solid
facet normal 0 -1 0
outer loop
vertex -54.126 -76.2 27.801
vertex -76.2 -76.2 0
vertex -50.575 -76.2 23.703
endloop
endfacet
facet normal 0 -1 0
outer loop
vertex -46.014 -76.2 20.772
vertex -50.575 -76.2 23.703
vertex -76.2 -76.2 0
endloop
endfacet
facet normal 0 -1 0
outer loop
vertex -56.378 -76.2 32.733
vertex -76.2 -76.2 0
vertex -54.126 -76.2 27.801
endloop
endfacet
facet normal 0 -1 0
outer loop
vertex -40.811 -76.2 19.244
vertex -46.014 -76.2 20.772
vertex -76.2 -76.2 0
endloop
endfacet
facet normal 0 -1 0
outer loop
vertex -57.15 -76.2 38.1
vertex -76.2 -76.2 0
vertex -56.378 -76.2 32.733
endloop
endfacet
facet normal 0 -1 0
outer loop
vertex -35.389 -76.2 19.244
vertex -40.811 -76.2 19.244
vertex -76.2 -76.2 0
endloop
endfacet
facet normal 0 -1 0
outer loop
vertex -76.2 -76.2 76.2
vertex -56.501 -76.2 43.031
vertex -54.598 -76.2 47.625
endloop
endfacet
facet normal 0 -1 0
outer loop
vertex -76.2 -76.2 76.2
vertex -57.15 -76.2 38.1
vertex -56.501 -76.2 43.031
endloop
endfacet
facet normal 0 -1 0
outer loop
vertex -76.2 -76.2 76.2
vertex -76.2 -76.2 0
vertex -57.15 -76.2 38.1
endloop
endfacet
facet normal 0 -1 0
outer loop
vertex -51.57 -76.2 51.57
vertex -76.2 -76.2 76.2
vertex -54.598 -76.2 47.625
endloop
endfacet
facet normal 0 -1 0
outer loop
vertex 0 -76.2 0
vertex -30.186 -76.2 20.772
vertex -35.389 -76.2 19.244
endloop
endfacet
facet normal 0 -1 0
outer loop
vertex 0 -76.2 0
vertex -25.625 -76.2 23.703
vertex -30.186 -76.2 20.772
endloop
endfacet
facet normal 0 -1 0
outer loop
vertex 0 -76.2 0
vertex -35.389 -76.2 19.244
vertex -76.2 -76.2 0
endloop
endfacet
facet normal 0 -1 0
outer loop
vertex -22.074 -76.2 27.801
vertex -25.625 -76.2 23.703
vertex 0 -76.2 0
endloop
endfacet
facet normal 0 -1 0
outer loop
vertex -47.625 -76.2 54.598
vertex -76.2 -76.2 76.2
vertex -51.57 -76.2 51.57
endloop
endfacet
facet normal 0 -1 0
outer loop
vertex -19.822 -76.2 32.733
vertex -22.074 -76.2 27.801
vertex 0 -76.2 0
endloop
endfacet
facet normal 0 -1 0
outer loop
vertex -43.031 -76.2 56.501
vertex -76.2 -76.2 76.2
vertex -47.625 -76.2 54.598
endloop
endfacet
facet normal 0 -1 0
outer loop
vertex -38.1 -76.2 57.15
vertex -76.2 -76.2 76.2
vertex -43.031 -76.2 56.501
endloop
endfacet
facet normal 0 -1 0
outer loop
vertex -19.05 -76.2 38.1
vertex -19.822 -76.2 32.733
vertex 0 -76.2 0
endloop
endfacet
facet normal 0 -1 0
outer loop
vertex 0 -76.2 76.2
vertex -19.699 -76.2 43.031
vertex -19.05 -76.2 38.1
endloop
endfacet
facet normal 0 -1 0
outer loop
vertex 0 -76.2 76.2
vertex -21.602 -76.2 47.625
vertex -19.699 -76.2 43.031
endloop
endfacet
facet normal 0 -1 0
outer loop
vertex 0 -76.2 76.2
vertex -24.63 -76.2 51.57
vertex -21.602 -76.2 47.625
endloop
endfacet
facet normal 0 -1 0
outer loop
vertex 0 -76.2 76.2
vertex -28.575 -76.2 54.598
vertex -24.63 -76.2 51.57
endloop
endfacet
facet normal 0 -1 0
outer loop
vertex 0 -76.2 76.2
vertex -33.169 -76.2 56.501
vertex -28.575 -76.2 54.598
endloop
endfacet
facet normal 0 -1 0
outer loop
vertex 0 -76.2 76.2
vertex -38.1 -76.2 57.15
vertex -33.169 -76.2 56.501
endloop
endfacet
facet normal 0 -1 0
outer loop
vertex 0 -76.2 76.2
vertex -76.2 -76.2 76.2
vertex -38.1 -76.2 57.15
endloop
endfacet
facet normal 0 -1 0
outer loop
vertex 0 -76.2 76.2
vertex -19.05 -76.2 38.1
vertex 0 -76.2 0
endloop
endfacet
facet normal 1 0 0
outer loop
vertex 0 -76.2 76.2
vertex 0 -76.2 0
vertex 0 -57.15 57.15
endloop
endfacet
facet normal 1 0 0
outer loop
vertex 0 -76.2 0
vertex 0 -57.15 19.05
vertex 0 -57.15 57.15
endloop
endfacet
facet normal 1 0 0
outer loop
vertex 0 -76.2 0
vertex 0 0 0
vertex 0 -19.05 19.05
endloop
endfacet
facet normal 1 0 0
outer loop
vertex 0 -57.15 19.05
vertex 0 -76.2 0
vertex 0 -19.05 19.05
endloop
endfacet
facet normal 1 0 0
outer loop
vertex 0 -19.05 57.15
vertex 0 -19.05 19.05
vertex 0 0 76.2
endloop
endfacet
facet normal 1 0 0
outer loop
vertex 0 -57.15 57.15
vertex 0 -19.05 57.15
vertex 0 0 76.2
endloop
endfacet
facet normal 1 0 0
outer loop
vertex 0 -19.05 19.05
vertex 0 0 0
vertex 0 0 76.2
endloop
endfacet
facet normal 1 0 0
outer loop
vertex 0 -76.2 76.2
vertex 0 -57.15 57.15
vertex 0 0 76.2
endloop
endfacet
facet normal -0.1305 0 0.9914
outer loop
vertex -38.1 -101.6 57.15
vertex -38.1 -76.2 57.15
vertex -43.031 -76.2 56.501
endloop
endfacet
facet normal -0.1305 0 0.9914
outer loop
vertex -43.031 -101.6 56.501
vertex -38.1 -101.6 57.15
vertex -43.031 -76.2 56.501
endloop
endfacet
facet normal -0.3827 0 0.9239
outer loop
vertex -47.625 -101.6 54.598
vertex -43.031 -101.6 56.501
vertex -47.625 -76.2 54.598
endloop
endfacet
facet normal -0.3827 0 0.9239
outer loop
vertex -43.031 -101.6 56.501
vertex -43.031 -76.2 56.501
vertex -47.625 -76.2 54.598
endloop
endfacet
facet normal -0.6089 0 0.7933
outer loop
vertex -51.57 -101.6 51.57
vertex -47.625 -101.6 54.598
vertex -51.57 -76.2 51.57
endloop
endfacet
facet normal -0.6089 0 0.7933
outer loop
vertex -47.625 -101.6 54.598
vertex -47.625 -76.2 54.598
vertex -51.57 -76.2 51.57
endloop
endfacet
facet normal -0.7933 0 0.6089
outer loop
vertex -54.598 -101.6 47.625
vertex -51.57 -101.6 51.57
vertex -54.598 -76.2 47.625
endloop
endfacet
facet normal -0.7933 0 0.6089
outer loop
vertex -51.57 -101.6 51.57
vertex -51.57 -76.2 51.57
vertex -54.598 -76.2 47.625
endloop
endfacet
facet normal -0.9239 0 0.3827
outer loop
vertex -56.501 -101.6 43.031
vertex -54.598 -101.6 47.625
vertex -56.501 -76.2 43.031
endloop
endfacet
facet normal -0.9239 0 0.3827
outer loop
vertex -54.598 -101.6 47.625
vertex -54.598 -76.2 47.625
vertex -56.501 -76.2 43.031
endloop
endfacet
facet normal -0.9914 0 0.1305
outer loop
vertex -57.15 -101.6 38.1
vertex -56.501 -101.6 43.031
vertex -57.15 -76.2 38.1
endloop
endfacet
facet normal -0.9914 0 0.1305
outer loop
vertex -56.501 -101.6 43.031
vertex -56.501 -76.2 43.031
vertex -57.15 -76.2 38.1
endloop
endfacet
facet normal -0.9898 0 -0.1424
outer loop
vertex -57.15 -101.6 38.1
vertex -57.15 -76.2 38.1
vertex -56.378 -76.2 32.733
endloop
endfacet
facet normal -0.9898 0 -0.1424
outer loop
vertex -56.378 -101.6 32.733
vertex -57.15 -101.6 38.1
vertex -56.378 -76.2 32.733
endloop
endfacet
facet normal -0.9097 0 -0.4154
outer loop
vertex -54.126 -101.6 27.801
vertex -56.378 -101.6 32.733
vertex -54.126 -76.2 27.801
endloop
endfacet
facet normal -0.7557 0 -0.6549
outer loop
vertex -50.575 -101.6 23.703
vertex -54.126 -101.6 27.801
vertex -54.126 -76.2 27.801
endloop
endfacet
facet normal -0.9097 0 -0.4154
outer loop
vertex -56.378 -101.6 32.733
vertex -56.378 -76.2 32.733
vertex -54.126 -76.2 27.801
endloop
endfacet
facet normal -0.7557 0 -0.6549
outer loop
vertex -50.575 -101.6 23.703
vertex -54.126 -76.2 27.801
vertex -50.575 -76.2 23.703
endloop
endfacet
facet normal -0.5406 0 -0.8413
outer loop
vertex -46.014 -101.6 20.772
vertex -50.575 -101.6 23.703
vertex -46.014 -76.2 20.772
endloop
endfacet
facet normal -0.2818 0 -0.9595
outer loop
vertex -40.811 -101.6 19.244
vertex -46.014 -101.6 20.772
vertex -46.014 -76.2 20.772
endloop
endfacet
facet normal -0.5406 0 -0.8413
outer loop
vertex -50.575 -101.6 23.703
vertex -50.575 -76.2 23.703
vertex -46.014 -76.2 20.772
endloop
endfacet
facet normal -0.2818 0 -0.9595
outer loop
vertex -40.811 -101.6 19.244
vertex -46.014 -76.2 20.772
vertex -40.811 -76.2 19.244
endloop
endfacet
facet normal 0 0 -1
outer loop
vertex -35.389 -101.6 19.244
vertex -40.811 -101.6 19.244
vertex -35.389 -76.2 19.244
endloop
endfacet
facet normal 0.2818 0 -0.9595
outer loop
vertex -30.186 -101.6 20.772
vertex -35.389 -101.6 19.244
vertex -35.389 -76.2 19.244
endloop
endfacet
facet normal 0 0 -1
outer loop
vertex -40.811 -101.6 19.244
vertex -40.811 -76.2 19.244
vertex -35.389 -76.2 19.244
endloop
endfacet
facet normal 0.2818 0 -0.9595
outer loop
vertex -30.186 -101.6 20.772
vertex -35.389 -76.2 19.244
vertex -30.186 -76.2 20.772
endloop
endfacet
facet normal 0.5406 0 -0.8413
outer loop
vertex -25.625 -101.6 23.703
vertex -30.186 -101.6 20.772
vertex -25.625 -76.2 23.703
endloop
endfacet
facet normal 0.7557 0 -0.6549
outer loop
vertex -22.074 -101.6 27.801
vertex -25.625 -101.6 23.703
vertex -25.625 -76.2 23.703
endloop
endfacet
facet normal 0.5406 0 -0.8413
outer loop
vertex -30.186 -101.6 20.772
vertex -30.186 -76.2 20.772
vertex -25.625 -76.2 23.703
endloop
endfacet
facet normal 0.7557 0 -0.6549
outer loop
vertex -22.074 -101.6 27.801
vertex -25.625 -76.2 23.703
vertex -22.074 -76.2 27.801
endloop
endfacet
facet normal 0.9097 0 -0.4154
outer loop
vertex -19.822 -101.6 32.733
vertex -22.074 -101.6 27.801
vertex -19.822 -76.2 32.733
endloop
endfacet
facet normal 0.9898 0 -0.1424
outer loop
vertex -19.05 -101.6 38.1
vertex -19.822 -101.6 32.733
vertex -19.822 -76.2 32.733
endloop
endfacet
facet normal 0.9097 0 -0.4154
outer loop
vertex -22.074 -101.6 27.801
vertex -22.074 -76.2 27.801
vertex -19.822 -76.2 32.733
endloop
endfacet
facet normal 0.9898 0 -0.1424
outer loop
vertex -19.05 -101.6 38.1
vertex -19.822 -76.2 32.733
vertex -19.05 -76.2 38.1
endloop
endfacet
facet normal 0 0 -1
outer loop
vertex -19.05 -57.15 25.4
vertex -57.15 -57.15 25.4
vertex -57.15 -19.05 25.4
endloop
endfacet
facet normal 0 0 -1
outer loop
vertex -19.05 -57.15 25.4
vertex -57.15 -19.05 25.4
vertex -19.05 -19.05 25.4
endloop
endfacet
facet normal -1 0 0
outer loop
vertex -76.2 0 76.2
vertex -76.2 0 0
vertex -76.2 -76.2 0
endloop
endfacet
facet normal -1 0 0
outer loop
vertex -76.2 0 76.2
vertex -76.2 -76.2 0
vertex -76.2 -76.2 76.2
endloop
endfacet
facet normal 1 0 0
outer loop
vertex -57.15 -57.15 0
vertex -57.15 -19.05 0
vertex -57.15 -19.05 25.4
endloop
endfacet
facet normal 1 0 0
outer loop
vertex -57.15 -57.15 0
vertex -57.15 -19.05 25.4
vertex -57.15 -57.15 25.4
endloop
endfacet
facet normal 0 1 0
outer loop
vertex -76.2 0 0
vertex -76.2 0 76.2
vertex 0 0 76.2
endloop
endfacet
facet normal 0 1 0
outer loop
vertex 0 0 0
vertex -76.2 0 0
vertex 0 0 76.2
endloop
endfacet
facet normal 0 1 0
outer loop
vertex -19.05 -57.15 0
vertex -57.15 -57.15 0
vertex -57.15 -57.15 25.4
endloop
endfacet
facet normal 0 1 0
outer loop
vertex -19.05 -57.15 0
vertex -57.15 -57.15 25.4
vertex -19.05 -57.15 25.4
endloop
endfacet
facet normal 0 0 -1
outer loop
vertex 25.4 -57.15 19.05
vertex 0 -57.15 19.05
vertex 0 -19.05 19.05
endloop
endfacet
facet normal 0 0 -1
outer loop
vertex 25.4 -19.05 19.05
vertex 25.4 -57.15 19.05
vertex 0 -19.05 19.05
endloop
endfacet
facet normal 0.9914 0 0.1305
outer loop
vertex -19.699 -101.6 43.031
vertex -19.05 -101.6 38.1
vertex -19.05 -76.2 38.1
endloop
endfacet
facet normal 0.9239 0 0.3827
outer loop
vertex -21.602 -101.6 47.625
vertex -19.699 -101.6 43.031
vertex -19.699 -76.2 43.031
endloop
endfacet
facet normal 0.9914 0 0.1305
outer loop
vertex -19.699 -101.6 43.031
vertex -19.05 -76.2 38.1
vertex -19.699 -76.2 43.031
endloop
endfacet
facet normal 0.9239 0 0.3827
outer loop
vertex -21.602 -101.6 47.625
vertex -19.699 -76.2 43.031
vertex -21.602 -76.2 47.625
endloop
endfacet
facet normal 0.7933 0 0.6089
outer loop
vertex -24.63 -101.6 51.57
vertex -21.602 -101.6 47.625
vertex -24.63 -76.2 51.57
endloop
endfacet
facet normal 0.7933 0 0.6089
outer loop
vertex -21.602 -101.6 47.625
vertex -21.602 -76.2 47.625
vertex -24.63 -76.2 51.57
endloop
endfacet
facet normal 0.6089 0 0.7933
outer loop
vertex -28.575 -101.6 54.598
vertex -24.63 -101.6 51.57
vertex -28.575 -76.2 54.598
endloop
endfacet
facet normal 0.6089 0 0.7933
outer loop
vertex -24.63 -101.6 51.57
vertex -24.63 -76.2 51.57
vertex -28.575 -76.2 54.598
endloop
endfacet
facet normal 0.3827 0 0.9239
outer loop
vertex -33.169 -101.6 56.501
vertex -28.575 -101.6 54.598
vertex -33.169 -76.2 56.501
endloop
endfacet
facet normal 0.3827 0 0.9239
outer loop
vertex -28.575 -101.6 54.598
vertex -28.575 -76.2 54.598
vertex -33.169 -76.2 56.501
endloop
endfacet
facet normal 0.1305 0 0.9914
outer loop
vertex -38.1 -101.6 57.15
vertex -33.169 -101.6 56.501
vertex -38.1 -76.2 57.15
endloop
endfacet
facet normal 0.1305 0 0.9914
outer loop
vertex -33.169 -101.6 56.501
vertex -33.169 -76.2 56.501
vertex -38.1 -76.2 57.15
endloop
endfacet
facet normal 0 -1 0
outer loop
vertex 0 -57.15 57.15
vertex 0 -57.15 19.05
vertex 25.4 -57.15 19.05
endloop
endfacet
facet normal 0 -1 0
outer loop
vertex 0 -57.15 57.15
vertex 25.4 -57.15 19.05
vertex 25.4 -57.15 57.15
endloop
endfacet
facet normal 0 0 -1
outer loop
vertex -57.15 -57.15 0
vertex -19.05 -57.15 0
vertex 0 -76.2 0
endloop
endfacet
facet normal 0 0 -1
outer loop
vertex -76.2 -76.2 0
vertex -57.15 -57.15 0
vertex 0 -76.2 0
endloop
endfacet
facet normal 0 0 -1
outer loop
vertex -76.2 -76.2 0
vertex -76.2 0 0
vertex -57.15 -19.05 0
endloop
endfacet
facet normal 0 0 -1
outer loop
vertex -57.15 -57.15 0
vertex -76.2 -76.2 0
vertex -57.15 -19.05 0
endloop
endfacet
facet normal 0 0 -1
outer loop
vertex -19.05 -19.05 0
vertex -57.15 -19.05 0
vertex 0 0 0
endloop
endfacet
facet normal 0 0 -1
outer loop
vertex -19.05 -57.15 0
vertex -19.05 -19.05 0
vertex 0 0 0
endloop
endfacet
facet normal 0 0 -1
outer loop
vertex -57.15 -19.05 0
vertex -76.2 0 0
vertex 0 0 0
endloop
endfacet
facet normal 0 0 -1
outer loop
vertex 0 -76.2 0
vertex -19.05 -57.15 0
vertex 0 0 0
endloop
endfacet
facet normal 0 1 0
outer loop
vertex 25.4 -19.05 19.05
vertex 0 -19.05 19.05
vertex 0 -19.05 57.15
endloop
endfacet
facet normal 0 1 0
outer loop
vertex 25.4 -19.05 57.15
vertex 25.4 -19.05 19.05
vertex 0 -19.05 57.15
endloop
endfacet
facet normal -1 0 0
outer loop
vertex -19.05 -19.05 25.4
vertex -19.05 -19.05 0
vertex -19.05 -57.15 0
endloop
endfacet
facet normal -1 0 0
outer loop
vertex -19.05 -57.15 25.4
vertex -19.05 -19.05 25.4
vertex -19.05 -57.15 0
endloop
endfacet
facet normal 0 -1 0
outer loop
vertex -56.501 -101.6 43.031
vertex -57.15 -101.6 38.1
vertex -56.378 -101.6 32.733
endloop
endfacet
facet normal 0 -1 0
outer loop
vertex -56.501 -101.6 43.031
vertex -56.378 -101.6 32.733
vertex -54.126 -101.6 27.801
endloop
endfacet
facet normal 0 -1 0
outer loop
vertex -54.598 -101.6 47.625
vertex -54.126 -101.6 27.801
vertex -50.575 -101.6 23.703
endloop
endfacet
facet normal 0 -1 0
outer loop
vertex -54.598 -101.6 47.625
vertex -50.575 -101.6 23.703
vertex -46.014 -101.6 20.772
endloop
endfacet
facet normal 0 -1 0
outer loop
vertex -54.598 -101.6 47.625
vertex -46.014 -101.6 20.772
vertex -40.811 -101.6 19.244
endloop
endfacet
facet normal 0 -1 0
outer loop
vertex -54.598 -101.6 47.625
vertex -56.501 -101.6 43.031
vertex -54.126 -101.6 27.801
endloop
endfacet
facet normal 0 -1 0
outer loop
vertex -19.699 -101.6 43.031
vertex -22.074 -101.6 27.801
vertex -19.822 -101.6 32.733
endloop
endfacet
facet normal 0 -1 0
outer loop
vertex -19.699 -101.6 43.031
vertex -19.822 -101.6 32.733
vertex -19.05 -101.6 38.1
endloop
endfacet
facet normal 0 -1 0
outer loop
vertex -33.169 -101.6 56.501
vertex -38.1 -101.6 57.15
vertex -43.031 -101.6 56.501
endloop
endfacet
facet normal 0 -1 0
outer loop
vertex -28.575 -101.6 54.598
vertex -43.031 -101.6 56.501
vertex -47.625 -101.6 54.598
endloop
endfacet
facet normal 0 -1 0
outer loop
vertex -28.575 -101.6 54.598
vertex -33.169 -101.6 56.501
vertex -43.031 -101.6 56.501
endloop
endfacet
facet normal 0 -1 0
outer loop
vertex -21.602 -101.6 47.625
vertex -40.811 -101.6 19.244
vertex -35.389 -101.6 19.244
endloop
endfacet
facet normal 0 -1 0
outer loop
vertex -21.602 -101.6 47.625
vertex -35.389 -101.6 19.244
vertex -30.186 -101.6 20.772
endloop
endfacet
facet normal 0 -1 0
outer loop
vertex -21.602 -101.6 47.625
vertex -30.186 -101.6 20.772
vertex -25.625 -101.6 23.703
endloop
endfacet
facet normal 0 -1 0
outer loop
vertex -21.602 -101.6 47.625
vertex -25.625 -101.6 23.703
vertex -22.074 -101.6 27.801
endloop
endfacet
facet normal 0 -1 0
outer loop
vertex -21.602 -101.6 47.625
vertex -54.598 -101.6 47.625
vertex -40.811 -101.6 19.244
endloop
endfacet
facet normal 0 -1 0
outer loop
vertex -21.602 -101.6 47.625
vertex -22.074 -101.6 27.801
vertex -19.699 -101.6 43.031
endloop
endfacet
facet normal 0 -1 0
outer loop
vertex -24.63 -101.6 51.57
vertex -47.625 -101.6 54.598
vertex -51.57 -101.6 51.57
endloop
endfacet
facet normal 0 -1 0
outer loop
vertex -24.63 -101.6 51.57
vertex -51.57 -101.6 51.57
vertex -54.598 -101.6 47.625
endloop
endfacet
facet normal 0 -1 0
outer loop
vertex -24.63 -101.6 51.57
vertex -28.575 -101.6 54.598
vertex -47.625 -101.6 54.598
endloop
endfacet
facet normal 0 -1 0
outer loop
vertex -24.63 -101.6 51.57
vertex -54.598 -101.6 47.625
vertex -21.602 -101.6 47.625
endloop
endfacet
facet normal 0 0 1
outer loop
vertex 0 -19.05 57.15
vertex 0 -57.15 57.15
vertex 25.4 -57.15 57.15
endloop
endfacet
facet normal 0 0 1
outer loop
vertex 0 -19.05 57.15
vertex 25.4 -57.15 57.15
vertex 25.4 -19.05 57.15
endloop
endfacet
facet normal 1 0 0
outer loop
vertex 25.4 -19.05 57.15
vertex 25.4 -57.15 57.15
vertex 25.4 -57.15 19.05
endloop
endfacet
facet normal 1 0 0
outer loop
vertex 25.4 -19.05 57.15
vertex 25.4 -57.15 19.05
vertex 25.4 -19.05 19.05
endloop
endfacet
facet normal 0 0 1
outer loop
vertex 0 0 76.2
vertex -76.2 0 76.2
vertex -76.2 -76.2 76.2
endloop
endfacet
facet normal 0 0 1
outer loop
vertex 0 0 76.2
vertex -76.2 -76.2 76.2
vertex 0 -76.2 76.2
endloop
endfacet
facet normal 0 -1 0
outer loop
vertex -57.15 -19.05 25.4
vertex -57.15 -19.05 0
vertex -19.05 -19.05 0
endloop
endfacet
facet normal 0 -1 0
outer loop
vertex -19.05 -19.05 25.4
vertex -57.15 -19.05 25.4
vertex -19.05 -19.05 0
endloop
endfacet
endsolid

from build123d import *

# Parameters (mm, degrees)
F0_W     = 76.2
F0_H     = 76.2
F1_DEPTH = 76.2
F3_DEPTH = 25.4
F4_W     = 38.1
F4_H     = 38.1
F5_DEPTH = 25.4
F6_W     = 38.1
F6_H     = 38.1
F7_DEPTH = 25.4


with BuildPart() as f1:
    # F0 (on Front) → F1 (new body)
    with BuildSketch(Plane.XZ):
        with Locations((-38.1, 38.1)):
            Rectangle(F0_W, F0_H)
    extrude(amount=F1_DEPTH)

    # F2 (on face) → F3 (join)
    with BuildSketch(Plane.XZ.offset(76.2)):
        with BuildLine():
            Line((-38.1, 38.1), (-38.1, 57.15))
            ThreePointArc((-38.1, 57.15), (-51.570384, 51.570384), (-57.15, 38.1))
            Line((-57.15, 38.1), (-38.1, 38.1))
        make_face()
        with BuildLine():
            ThreePointArc((-57.15, 38.1), (-38.1, 19.05), (-19.05, 38.1))
            ThreePointArc((-19.05, 38.1), (-24.629616, 51.570384), (-38.1, 57.15))
            Line((-38.1, 57.15), (-38.1, 38.1))
            Line((-38.1, 38.1), (-57.15, 38.1))
        make_face()
    extrude(amount=F3_DEPTH)

    # F4 (on face) → F5 (join)
    with BuildSketch(Plane.YZ):
        with Locations((-38.1, 38.1)):
            Rectangle(F4_W, F4_H)
    extrude(amount=F5_DEPTH)

    # F6 (on face) → F7 (cut)
    with BuildSketch(Plane(origin=(0, 0, 0), x_dir=(1, 0, 0), z_dir=(0, 0, -1))):
        with Locations((-38.1, 38.1)):
            Rectangle(F6_W, F6_H)
    extrude(amount=-F7_DEPTH, mode=Mode.SUBTRACT)


solid = f1.part
